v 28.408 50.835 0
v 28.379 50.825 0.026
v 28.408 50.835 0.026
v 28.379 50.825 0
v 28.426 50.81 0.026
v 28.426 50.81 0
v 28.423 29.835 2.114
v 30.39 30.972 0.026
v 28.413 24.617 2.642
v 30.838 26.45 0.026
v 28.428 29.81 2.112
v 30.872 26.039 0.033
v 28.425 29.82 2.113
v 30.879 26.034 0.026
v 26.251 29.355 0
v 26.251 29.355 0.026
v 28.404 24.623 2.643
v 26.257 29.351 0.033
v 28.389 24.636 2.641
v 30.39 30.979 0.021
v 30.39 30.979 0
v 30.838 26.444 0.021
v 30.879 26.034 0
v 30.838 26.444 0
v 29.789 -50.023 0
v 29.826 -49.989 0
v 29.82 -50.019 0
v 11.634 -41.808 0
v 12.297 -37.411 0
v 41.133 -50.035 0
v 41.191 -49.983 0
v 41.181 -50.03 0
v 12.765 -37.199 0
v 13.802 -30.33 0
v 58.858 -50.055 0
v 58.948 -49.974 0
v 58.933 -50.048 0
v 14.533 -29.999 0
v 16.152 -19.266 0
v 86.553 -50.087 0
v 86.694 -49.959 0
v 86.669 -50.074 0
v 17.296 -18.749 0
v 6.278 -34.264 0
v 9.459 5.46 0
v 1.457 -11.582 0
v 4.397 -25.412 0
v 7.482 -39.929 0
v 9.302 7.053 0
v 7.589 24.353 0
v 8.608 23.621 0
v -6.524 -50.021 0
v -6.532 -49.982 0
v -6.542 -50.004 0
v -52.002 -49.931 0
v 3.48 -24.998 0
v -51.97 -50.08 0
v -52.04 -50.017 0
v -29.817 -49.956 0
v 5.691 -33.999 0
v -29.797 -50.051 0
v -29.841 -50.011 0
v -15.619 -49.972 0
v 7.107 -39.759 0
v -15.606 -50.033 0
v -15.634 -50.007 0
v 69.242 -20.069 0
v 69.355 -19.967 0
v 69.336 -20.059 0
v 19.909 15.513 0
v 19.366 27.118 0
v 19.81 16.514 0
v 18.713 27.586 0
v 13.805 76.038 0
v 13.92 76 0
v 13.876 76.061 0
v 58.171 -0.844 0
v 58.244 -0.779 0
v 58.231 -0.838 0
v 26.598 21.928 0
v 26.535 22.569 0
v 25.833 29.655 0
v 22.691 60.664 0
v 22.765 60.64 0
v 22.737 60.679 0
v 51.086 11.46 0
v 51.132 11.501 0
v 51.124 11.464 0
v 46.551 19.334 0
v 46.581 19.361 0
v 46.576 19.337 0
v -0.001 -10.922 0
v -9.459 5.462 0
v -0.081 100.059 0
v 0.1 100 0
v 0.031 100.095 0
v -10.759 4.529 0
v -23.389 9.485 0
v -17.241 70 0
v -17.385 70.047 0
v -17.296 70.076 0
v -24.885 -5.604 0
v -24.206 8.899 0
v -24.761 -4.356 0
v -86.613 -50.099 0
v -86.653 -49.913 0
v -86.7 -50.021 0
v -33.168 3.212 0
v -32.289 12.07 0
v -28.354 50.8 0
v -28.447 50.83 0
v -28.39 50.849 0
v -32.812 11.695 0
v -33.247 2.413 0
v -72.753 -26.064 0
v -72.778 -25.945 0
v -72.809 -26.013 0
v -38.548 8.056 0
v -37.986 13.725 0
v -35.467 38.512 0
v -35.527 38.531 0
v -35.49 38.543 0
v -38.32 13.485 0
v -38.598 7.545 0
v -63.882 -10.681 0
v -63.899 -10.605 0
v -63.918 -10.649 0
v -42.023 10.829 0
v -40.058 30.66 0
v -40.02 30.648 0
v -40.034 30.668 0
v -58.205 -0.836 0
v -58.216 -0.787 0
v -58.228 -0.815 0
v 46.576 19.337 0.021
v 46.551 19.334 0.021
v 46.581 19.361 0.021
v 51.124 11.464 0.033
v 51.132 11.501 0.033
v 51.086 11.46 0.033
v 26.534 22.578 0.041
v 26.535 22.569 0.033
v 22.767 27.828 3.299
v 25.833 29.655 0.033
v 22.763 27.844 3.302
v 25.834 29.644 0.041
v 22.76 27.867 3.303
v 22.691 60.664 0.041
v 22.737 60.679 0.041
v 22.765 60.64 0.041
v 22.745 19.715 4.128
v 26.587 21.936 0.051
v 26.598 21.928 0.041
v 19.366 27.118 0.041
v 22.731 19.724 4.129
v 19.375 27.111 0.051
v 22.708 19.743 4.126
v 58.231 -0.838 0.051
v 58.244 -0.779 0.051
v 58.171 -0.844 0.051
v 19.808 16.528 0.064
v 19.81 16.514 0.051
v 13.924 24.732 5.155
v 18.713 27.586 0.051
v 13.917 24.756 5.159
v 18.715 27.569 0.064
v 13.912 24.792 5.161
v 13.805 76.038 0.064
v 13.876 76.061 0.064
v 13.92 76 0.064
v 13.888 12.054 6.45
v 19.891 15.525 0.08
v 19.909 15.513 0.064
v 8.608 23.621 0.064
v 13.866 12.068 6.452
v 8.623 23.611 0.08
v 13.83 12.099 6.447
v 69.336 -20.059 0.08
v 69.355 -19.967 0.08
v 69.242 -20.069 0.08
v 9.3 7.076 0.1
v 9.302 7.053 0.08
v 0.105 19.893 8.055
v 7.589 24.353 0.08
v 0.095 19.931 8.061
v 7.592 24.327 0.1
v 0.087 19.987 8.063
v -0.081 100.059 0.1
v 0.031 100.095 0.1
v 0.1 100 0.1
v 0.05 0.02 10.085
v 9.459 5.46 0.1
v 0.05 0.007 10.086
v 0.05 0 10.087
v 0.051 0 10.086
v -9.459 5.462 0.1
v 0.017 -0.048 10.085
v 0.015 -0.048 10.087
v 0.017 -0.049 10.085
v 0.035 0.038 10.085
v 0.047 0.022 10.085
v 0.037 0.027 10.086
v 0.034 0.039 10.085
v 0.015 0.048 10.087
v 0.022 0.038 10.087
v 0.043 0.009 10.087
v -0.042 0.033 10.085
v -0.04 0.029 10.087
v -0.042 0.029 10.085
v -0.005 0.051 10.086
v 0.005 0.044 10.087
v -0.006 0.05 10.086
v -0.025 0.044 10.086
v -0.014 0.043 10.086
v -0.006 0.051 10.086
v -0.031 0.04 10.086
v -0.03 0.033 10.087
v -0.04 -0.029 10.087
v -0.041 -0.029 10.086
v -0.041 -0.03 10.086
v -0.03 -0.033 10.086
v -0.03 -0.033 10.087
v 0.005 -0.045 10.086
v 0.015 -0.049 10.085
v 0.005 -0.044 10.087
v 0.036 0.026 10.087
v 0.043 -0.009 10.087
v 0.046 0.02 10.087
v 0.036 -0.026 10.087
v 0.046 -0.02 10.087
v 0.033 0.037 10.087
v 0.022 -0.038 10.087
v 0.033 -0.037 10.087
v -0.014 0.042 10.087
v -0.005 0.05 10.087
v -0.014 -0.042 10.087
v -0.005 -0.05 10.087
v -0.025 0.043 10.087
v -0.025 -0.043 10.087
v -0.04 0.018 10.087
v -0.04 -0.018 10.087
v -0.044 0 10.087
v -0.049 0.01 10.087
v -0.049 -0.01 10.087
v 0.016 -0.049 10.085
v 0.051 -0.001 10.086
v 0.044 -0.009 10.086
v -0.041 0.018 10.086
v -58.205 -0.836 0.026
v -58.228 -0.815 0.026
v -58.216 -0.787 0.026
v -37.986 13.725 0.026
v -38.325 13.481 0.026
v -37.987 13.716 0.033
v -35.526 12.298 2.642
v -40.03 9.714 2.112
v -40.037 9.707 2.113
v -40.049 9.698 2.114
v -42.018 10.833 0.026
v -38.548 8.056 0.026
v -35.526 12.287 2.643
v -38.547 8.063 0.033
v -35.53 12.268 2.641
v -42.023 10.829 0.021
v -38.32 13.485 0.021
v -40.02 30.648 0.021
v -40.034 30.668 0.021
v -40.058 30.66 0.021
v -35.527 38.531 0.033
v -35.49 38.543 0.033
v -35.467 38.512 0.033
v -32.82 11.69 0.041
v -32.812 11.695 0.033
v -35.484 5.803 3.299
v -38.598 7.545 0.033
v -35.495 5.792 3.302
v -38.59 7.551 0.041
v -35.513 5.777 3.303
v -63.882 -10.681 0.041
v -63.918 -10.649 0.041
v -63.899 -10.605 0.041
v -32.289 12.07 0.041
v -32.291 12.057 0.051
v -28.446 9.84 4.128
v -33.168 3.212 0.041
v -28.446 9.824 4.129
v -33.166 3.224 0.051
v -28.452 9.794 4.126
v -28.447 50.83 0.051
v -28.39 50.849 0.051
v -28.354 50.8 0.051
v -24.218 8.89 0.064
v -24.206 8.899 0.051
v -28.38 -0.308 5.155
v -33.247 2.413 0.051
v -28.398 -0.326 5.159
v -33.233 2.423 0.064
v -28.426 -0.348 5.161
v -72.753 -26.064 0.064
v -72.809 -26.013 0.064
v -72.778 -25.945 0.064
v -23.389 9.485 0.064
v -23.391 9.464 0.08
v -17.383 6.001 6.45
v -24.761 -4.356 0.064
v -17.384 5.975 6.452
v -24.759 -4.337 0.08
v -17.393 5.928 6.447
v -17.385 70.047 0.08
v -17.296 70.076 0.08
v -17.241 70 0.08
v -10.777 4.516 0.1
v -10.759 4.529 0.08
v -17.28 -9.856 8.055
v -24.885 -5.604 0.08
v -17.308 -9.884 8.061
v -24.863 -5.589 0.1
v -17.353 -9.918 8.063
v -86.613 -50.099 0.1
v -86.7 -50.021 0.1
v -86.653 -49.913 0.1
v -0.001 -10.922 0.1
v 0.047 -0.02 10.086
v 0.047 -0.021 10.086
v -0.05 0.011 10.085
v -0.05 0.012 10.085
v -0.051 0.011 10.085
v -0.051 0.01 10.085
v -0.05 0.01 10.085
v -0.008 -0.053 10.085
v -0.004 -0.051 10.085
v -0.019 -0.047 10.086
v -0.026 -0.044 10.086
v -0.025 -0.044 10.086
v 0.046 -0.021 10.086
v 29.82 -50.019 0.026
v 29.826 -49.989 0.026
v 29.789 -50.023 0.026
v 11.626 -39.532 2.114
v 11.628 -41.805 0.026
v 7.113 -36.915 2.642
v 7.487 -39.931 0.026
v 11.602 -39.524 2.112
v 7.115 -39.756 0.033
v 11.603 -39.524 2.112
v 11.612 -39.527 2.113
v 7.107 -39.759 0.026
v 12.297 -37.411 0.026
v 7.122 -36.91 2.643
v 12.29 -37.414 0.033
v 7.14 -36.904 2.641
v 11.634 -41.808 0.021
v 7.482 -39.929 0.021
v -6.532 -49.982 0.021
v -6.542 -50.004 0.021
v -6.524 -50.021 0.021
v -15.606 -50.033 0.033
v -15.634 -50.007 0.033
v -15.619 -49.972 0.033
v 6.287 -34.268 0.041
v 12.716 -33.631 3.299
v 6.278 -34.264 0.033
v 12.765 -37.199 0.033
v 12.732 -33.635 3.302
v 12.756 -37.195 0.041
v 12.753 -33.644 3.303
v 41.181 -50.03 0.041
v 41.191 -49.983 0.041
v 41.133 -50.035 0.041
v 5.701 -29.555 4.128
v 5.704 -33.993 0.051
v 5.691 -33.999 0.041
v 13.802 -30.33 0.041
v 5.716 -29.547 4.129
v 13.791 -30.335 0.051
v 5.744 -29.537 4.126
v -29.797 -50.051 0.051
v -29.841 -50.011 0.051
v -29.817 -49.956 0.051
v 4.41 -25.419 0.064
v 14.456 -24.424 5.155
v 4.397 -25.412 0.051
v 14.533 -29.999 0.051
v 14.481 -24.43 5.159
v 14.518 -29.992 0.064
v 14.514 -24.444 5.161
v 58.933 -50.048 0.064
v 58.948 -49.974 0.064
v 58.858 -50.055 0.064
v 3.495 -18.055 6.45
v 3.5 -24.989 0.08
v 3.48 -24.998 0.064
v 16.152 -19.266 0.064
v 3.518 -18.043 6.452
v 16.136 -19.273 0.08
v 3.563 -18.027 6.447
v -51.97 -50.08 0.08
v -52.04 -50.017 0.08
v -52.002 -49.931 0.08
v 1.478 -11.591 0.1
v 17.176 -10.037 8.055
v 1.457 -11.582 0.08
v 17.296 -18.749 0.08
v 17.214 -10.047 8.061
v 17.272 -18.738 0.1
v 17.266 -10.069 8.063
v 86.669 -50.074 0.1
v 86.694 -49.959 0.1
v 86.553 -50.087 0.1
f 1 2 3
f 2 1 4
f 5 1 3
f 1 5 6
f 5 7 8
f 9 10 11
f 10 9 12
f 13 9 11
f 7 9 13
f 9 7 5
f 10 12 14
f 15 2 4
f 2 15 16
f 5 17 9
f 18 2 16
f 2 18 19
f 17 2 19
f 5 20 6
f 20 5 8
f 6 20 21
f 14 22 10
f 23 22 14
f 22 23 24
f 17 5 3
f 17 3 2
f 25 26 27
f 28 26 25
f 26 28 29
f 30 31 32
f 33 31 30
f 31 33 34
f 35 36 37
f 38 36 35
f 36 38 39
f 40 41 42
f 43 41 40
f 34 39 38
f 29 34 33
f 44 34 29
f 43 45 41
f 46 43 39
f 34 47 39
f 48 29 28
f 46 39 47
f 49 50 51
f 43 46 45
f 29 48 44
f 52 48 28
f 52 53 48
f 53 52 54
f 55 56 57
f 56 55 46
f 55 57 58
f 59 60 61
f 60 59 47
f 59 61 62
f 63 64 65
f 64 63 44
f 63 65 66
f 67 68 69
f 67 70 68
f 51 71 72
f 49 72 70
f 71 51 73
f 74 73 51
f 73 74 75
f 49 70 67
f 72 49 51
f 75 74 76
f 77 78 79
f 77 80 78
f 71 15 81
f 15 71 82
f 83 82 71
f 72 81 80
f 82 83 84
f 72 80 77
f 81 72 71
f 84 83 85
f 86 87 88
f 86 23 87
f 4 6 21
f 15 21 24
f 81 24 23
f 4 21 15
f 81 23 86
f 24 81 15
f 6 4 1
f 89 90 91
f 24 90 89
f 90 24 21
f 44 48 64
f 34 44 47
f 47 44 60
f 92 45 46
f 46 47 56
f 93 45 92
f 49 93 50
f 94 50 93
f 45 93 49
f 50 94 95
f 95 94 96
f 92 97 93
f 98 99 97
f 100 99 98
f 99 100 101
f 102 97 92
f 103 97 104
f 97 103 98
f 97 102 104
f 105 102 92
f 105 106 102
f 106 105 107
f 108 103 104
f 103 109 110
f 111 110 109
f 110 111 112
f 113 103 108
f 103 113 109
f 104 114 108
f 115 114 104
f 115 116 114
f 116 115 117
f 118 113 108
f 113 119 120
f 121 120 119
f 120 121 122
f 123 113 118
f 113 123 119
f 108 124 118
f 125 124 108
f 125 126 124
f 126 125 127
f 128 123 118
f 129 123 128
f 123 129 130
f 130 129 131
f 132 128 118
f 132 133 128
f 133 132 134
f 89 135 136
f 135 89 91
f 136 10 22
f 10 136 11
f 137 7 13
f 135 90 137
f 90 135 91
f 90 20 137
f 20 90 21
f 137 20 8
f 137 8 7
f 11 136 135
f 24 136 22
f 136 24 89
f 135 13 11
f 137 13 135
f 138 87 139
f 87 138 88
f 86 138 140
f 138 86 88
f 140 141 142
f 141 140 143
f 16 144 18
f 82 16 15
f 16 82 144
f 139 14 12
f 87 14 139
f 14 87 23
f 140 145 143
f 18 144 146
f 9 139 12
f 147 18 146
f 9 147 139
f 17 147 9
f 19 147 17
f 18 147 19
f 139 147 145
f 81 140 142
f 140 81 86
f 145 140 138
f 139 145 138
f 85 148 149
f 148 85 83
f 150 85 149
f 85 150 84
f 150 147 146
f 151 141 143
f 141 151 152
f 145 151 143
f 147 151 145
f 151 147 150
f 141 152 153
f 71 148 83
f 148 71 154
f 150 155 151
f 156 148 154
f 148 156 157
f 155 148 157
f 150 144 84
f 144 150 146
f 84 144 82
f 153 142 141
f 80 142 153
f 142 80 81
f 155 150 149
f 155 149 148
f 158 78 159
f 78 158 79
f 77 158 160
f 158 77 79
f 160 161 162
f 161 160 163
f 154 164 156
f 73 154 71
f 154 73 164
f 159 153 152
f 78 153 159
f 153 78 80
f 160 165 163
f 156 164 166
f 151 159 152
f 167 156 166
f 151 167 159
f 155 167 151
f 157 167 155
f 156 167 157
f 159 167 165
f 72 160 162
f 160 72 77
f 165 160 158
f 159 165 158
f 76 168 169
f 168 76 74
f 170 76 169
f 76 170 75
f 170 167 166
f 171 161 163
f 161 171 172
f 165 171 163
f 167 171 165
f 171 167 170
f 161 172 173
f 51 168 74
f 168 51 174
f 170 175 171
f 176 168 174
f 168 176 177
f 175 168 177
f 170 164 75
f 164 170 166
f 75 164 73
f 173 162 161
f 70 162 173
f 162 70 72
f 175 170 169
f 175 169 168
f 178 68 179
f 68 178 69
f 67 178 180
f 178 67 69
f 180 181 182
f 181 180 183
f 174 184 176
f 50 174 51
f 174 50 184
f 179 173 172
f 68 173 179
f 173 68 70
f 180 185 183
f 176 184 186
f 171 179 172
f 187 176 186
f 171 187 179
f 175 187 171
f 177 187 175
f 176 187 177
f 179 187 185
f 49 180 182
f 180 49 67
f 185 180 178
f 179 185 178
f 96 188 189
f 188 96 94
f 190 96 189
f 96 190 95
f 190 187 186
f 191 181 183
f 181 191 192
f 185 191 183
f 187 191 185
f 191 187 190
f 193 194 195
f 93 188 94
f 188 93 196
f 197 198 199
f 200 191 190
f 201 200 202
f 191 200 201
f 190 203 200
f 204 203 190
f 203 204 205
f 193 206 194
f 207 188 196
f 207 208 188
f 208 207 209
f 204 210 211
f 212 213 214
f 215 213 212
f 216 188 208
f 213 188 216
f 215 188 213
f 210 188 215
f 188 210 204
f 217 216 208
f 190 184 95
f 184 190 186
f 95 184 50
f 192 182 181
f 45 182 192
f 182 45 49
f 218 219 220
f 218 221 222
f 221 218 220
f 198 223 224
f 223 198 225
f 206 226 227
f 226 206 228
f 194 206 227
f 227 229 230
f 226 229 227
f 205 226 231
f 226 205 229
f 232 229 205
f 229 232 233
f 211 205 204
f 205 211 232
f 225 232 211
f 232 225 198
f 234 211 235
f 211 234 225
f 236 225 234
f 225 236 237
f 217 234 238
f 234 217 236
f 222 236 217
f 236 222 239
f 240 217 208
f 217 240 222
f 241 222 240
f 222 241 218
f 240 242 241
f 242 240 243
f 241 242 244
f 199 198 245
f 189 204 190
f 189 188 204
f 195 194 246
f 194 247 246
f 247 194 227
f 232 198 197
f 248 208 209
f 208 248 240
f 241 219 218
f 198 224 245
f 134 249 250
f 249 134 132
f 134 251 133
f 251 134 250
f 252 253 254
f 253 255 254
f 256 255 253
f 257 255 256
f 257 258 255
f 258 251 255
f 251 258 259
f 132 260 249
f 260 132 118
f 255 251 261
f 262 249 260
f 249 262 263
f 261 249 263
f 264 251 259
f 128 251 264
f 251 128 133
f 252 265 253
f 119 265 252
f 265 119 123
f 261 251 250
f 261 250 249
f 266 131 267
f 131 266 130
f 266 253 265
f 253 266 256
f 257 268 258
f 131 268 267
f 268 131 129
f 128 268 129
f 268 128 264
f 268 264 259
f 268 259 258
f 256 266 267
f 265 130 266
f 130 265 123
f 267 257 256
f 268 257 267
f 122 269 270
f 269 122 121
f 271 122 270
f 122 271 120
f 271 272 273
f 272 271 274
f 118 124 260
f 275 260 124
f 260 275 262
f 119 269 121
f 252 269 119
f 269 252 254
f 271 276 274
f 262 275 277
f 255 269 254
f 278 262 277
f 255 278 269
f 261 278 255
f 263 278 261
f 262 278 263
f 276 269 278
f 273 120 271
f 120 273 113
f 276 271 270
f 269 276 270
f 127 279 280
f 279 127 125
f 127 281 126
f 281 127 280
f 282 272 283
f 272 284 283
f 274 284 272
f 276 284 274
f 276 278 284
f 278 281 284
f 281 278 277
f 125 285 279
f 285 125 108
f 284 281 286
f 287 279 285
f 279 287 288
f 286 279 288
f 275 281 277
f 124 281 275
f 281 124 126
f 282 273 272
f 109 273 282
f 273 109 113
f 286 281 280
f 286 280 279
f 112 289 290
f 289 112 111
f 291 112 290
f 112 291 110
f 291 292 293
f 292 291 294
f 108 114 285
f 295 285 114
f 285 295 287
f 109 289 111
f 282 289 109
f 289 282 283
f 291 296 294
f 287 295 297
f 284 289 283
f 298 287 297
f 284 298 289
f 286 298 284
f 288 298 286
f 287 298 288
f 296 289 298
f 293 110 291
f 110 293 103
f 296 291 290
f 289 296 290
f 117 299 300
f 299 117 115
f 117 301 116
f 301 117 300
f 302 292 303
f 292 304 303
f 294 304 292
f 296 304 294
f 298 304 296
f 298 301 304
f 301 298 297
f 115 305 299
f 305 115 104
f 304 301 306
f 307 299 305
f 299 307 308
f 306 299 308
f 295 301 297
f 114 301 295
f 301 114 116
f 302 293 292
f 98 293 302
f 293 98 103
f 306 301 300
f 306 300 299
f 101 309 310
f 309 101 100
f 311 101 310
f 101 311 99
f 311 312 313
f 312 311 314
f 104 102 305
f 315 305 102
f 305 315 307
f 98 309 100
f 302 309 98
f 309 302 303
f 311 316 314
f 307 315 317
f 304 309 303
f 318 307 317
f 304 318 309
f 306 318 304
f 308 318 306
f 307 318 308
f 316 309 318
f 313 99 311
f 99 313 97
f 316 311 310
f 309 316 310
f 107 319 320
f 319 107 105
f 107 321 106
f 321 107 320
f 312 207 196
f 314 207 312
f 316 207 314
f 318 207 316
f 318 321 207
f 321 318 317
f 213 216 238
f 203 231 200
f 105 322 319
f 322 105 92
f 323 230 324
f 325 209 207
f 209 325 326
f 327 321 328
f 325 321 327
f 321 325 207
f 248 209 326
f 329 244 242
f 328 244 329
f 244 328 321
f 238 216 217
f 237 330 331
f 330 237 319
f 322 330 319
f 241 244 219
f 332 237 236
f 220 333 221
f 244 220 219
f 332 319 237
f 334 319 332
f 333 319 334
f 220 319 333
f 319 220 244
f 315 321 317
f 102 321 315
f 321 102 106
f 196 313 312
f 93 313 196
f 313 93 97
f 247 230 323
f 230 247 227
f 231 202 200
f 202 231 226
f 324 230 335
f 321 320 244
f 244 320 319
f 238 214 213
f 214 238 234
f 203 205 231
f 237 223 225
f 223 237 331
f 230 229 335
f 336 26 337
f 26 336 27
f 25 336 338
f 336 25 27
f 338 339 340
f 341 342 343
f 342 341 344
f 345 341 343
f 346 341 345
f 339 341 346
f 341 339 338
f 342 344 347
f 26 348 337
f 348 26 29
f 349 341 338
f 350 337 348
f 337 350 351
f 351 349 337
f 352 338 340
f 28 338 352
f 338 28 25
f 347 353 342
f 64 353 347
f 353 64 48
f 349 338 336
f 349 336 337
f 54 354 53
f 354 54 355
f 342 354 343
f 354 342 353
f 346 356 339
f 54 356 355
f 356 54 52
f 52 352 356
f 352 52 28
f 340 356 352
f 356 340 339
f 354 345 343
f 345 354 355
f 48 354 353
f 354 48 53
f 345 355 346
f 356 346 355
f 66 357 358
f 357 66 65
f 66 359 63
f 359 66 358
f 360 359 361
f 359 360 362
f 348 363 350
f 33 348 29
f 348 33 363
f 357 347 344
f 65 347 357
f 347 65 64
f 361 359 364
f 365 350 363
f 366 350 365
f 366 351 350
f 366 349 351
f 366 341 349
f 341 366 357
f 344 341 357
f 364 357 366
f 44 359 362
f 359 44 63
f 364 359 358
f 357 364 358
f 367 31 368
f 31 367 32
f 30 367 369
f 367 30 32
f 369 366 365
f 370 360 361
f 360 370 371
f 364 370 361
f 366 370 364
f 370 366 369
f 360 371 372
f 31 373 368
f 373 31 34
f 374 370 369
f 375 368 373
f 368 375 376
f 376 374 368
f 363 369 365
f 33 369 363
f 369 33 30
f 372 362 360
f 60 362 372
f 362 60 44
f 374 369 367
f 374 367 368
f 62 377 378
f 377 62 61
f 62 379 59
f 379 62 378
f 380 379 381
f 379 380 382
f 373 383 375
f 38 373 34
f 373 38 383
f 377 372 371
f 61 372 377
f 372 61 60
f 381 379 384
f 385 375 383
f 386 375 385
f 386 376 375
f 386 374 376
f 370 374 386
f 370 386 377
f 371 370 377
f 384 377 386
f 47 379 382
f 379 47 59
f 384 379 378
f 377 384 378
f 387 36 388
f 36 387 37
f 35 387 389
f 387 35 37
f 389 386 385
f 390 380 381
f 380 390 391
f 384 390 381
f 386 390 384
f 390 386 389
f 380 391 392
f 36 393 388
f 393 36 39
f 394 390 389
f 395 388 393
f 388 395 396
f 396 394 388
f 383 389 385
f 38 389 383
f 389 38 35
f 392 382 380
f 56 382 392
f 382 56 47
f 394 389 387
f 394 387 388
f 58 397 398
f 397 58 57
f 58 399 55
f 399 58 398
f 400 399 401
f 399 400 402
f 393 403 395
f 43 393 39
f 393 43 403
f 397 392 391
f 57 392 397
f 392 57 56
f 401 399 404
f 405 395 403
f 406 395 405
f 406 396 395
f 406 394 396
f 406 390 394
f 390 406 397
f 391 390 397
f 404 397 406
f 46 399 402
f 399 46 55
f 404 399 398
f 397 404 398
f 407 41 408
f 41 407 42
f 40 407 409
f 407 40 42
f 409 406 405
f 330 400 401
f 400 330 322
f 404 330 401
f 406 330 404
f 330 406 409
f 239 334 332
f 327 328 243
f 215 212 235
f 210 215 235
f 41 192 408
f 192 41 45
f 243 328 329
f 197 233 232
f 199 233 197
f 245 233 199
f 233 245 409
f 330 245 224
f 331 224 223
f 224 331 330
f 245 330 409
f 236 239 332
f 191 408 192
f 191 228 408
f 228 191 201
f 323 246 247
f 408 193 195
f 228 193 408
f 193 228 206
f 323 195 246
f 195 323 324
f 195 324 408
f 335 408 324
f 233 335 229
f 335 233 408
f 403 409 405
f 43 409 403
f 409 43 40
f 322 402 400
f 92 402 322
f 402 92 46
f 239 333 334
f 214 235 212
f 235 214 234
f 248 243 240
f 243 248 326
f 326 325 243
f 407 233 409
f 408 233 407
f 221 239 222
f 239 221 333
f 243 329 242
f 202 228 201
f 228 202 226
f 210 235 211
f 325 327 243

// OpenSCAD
module recursive_crystal(l=100,s=0.75,n=3){
    hull(){
        cylinder(r=10,h=0.1);
        translate([0,0,10]){sphere(0.1);}
        translate([0,l,0]){cylinder(r=0.1,h=0.1);}
    }
    if(n>0){
        translate([0,l*(1-s),0]){
            rotate([0,0,120*(1-2*(n%2))]){
                scale(s){
                    recursive_crystal(l,s,n-1);
                }
            }
        }
    }
}

color("#FFF"){
for(angle=[0,120,240]){
    rotate(angle){
        recursive_crystal(100,0.8,7);
    }
}
}

//openscad finespun_flag.scad -o finespun_flag.png --imgsize=1000,1000 --colorscheme=Starnight --projection=o --camera=0,20,475,0,20,0
